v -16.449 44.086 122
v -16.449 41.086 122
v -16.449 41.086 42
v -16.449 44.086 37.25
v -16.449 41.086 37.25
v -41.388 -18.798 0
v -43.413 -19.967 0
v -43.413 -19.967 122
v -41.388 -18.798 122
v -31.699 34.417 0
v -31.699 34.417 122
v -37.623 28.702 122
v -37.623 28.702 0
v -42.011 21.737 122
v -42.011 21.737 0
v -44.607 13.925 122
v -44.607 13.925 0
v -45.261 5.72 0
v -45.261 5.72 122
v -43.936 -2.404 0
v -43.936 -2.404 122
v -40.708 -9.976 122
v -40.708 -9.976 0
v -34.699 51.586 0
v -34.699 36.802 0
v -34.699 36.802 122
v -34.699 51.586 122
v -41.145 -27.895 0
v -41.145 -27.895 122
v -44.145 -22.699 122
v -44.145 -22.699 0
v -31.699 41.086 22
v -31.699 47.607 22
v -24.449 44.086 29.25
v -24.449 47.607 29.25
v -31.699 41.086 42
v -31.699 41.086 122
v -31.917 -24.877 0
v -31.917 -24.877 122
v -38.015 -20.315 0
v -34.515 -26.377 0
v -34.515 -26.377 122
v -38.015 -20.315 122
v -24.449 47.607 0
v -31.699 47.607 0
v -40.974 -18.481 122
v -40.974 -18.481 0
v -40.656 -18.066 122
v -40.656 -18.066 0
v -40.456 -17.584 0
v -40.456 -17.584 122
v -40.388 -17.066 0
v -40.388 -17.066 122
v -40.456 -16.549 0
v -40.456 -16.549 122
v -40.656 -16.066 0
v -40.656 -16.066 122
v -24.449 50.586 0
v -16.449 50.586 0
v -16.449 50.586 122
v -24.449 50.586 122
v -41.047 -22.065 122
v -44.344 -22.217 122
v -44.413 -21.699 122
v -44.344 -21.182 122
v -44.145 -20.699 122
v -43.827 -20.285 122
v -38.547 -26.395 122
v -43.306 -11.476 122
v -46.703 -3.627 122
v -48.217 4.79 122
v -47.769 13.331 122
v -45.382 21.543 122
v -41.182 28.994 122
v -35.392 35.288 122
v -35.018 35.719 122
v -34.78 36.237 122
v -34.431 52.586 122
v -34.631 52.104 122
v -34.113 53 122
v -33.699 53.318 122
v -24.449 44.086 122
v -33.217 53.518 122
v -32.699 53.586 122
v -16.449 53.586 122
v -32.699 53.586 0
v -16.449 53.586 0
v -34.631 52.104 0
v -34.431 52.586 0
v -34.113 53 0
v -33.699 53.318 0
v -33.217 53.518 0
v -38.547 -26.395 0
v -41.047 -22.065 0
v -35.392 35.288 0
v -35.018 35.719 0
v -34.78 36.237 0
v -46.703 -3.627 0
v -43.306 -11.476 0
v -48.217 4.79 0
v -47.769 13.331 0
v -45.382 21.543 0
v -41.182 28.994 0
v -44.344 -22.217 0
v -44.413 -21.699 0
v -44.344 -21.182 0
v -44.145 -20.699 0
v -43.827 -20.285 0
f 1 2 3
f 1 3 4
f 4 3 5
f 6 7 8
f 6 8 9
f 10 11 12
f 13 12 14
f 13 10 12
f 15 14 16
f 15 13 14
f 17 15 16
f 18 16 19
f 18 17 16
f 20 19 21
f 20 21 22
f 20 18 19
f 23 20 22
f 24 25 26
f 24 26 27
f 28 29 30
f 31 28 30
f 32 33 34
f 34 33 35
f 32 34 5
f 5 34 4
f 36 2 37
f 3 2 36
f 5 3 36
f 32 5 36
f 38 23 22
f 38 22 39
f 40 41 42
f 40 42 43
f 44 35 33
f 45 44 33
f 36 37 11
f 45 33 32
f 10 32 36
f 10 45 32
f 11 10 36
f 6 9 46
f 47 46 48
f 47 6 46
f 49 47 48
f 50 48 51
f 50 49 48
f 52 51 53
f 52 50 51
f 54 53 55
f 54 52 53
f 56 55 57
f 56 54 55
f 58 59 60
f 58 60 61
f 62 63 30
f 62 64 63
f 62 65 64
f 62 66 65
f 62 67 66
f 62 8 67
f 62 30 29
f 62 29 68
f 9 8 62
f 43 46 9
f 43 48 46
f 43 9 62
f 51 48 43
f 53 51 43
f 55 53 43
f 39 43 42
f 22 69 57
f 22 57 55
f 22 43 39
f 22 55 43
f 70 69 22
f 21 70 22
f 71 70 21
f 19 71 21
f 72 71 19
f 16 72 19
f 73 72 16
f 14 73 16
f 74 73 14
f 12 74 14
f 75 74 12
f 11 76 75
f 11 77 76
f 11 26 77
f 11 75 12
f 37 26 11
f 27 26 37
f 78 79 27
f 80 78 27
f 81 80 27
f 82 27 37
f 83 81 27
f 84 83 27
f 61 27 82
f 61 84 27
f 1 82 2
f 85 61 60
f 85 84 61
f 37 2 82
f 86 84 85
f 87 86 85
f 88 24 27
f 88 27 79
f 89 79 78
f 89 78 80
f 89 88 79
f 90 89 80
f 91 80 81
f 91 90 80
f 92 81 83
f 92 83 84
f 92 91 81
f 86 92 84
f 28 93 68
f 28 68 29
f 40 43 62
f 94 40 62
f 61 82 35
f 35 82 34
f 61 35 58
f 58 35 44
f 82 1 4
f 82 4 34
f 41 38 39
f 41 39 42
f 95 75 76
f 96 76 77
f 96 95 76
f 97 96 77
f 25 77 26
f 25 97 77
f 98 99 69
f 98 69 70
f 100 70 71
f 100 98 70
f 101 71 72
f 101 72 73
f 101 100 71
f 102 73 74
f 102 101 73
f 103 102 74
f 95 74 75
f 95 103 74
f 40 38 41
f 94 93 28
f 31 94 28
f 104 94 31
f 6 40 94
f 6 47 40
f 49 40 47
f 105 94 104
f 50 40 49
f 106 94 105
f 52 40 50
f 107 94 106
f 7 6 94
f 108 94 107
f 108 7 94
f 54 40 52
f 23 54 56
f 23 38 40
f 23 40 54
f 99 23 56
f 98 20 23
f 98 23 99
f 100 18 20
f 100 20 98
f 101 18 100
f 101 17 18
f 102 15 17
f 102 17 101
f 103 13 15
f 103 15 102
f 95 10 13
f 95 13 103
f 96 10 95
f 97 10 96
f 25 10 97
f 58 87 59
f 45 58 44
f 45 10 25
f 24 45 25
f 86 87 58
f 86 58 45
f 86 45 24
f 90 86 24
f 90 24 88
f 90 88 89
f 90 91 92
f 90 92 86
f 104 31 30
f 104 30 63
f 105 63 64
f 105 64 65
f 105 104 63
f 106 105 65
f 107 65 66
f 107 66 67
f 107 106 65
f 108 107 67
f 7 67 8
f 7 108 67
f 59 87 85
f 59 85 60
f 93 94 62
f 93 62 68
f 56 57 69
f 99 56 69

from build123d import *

# Parameters (mm, degrees)
BOSS_EXTRUDE1_DEPTH = 122
BOSS_EXTRUDE2_DEPTH = 80
CHAMFER2_SIZE       = 20


with BuildPart() as part:
    # Sketch1 → Boss-Extrude1 (new body)
    with BuildSketch(Plane.XY):
        with BuildLine():
            Line((-24.448977817, 50.585997889), (-24.448977817, 47.607417283))
            Line((-24.448977817, 47.607417283), (-31.698977817, 47.607417283))
            Line((-31.698977817, 47.607417283), (-31.698977817, 34.416624517))
            ThreePointArc((-31.698977817, 34.416624517), (-44.606827003, 13.925447751), (-40.708122297, -9.976455887))
            Line((-40.708122297, -9.976455887), (-31.917393168, -24.877445372))
            Line((-31.917393168, -24.877445372), (-34.51546938, -26.377445372))
            Line((-34.51546938, -26.377445372), (-38.01546938, -20.315267546))
            Line((-38.01546938, -20.315267546), (-41.046558293, -22.065267546))
            Line((-41.046558293, -22.065267546), (-38.546558293, -26.395394565))
            Line((-38.546558293, -26.395394565), (-41.144634504, -27.895394565))
            Line((-41.144634504, -27.895394565), (-44.144634504, -22.699242142))
            ThreePointArc((-44.144634504, -22.699242142), (-44.344435349, -21.181604052), (-43.412583697, -19.967191335))
            Line((-43.412583697, -19.967191335), (-41.388249315, -18.798441335))
            ThreePointArc((-41.388249315, -18.798441335), (-40.456397663, -17.584028617), (-40.656198508, -16.066390527))
            Line((-40.656198508, -16.066390527), (-43.306198508, -11.476455887))
            ThreePointArc((-43.306198508, -11.476455887), (-47.768566234, 13.330532327), (-35.392400045, 35.287988929))
            ThreePointArc((-35.392400045, 35.287988929), (-34.880578034, 35.969486614), (-34.698977817, 36.802206392))
            Line((-34.698977817, 36.802206392), (-34.698977817, 51.585997889))
            ThreePointArc((-34.698977817, 51.585997889), (-34.113191379, 53.000211451), (-32.698977817, 53.585997889))
            Line((-32.698977817, 53.585997889), (-16.448977817, 53.585997889))
            Line((-16.448977817, 53.585997889), (-16.448977817, 50.585997889))
            Line((-16.448977817, 50.585997889), (-24.448977817, 50.585997889))
        make_face()
    extrude(amount=BOSS_EXTRUDE1_DEPTH)

    # Sketch3 → Boss-Extrude2 (add)
    with BuildSketch(Plane.XY.offset(122)):
        Polygon((-31.698977817, 41.085997889), (-16.448977817, 41.085997889), (-16.448977817, 44.085997889), (-24.448977817, 44.085997889), (-24.448977817, 47.607417283), (-31.698977817, 47.607417283), align=None)
    extrude(amount=-BOSS_EXTRUDE2_DEPTH)

    # Chamfer2
    # the kernel refuses this chamfer: 20 mm, written as the material it adds along each edge
    with BuildSketch(Plane(origin=(-31.698977817, 47.607417283, 42), x_dir=(-0.02749587661058649, 0, -0.9996219169112968), z_dir=(0, -1, 0))) as chamfer2_piece_1_section:
        Polygon((CHAMFER2_SIZE * 0.999621916911, CHAMFER2_SIZE * 0.0274958766106), (-CHAMFER2_SIZE * 0.0274958766106, CHAMFER2_SIZE * 0.999621916911), (0, 0), align=None)
    chamfer2_piece_1 = extrude(amount=6.521419395, mode=Mode.PRIVATE)
    chamfer2_piece_1 = split(chamfer2_piece_1, bisect_by=Plane(origin=(-24.448977817, 45.846707586, 33.55788947), z_dir=(-1, 0, 0)), keep=Keep.TOP, mode=Mode.PRIVATE)
    chamfer2_piece_1 = split(chamfer2_piece_1, bisect_by=Plane(origin=(-28.61775968, 44.085997889, 33.55788947), z_dir=(0, 1, 0)), keep=Keep.TOP, mode=Mode.PRIVATE)
    add(chamfer2_piece_1)
    with BuildSketch(Plane(origin=(-31.698977817, 47.607417283, 42), x_dir=(-0.02749587661058649, 0, -0.9996219169112968), z_dir=(0, -1, 0))) as chamfer2_piece_2_section:
        Polygon((CHAMFER2_SIZE * 0.999621916911, CHAMFER2_SIZE * 0.0274958766106), (-CHAMFER2_SIZE * 0.0274958766106, CHAMFER2_SIZE * 0.999621916911), (0, 0), align=None)
    chamfer2_piece_2 = extrude(amount=6.521419395, mode=Mode.PRIVATE)
    chamfer2_piece_2 = split(chamfer2_piece_2, bisect_by=Plane(origin=(-24.448977817, 42.585997889, 33.55788947), z_dir=(-1, 0, 0)), keep=Keep.TOP, mode=Mode.PRIVATE)
    chamfer2_piece_2 = split(chamfer2_piece_2, bisect_by=Plane(origin=(-28.61775968, 44.085997889, 33.55788947), z_dir=(0, -1, 0)), keep=Keep.TOP, mode=Mode.PRIVATE)
    add(chamfer2_piece_2)
    with BuildSketch(Plane(origin=(-31.698977817, 47.607417283, 42), x_dir=(-0.02749587661058649, 0, -0.9996219169112968), z_dir=(0, -1, 0))) as chamfer2_piece_3_section:
        Polygon((CHAMFER2_SIZE * 0.999621916911, CHAMFER2_SIZE * 0.0274958766106), (-CHAMFER2_SIZE * 0.0274958766106, CHAMFER2_SIZE * 0.999621916911), (0, 0), align=None)
    chamfer2_piece_3 = extrude(amount=6.521419395, mode=Mode.PRIVATE)
    chamfer2_piece_3 = split(chamfer2_piece_3, bisect_by=Plane(origin=(-24.448977817, 42.585997889, 37.556915733), z_dir=(1, 0, 0)), keep=Keep.TOP, mode=Mode.PRIVATE)
    chamfer2_piece_3 = split(chamfer2_piece_3, bisect_by=Plane(origin=(-16.448977817, 42.585997889, 37.556915733), z_dir=(-1, 0, 0)), keep=Keep.TOP, mode=Mode.PRIVATE)
    chamfer2_piece_3 = split(chamfer2_piece_3, bisect_by=Plane(origin=(-21.010172904, 44.085997889, 37.556915733), z_dir=(0, -1, 0)), keep=Keep.TOP, mode=Mode.PRIVATE)
    add(chamfer2_piece_3)


solid = part.part
